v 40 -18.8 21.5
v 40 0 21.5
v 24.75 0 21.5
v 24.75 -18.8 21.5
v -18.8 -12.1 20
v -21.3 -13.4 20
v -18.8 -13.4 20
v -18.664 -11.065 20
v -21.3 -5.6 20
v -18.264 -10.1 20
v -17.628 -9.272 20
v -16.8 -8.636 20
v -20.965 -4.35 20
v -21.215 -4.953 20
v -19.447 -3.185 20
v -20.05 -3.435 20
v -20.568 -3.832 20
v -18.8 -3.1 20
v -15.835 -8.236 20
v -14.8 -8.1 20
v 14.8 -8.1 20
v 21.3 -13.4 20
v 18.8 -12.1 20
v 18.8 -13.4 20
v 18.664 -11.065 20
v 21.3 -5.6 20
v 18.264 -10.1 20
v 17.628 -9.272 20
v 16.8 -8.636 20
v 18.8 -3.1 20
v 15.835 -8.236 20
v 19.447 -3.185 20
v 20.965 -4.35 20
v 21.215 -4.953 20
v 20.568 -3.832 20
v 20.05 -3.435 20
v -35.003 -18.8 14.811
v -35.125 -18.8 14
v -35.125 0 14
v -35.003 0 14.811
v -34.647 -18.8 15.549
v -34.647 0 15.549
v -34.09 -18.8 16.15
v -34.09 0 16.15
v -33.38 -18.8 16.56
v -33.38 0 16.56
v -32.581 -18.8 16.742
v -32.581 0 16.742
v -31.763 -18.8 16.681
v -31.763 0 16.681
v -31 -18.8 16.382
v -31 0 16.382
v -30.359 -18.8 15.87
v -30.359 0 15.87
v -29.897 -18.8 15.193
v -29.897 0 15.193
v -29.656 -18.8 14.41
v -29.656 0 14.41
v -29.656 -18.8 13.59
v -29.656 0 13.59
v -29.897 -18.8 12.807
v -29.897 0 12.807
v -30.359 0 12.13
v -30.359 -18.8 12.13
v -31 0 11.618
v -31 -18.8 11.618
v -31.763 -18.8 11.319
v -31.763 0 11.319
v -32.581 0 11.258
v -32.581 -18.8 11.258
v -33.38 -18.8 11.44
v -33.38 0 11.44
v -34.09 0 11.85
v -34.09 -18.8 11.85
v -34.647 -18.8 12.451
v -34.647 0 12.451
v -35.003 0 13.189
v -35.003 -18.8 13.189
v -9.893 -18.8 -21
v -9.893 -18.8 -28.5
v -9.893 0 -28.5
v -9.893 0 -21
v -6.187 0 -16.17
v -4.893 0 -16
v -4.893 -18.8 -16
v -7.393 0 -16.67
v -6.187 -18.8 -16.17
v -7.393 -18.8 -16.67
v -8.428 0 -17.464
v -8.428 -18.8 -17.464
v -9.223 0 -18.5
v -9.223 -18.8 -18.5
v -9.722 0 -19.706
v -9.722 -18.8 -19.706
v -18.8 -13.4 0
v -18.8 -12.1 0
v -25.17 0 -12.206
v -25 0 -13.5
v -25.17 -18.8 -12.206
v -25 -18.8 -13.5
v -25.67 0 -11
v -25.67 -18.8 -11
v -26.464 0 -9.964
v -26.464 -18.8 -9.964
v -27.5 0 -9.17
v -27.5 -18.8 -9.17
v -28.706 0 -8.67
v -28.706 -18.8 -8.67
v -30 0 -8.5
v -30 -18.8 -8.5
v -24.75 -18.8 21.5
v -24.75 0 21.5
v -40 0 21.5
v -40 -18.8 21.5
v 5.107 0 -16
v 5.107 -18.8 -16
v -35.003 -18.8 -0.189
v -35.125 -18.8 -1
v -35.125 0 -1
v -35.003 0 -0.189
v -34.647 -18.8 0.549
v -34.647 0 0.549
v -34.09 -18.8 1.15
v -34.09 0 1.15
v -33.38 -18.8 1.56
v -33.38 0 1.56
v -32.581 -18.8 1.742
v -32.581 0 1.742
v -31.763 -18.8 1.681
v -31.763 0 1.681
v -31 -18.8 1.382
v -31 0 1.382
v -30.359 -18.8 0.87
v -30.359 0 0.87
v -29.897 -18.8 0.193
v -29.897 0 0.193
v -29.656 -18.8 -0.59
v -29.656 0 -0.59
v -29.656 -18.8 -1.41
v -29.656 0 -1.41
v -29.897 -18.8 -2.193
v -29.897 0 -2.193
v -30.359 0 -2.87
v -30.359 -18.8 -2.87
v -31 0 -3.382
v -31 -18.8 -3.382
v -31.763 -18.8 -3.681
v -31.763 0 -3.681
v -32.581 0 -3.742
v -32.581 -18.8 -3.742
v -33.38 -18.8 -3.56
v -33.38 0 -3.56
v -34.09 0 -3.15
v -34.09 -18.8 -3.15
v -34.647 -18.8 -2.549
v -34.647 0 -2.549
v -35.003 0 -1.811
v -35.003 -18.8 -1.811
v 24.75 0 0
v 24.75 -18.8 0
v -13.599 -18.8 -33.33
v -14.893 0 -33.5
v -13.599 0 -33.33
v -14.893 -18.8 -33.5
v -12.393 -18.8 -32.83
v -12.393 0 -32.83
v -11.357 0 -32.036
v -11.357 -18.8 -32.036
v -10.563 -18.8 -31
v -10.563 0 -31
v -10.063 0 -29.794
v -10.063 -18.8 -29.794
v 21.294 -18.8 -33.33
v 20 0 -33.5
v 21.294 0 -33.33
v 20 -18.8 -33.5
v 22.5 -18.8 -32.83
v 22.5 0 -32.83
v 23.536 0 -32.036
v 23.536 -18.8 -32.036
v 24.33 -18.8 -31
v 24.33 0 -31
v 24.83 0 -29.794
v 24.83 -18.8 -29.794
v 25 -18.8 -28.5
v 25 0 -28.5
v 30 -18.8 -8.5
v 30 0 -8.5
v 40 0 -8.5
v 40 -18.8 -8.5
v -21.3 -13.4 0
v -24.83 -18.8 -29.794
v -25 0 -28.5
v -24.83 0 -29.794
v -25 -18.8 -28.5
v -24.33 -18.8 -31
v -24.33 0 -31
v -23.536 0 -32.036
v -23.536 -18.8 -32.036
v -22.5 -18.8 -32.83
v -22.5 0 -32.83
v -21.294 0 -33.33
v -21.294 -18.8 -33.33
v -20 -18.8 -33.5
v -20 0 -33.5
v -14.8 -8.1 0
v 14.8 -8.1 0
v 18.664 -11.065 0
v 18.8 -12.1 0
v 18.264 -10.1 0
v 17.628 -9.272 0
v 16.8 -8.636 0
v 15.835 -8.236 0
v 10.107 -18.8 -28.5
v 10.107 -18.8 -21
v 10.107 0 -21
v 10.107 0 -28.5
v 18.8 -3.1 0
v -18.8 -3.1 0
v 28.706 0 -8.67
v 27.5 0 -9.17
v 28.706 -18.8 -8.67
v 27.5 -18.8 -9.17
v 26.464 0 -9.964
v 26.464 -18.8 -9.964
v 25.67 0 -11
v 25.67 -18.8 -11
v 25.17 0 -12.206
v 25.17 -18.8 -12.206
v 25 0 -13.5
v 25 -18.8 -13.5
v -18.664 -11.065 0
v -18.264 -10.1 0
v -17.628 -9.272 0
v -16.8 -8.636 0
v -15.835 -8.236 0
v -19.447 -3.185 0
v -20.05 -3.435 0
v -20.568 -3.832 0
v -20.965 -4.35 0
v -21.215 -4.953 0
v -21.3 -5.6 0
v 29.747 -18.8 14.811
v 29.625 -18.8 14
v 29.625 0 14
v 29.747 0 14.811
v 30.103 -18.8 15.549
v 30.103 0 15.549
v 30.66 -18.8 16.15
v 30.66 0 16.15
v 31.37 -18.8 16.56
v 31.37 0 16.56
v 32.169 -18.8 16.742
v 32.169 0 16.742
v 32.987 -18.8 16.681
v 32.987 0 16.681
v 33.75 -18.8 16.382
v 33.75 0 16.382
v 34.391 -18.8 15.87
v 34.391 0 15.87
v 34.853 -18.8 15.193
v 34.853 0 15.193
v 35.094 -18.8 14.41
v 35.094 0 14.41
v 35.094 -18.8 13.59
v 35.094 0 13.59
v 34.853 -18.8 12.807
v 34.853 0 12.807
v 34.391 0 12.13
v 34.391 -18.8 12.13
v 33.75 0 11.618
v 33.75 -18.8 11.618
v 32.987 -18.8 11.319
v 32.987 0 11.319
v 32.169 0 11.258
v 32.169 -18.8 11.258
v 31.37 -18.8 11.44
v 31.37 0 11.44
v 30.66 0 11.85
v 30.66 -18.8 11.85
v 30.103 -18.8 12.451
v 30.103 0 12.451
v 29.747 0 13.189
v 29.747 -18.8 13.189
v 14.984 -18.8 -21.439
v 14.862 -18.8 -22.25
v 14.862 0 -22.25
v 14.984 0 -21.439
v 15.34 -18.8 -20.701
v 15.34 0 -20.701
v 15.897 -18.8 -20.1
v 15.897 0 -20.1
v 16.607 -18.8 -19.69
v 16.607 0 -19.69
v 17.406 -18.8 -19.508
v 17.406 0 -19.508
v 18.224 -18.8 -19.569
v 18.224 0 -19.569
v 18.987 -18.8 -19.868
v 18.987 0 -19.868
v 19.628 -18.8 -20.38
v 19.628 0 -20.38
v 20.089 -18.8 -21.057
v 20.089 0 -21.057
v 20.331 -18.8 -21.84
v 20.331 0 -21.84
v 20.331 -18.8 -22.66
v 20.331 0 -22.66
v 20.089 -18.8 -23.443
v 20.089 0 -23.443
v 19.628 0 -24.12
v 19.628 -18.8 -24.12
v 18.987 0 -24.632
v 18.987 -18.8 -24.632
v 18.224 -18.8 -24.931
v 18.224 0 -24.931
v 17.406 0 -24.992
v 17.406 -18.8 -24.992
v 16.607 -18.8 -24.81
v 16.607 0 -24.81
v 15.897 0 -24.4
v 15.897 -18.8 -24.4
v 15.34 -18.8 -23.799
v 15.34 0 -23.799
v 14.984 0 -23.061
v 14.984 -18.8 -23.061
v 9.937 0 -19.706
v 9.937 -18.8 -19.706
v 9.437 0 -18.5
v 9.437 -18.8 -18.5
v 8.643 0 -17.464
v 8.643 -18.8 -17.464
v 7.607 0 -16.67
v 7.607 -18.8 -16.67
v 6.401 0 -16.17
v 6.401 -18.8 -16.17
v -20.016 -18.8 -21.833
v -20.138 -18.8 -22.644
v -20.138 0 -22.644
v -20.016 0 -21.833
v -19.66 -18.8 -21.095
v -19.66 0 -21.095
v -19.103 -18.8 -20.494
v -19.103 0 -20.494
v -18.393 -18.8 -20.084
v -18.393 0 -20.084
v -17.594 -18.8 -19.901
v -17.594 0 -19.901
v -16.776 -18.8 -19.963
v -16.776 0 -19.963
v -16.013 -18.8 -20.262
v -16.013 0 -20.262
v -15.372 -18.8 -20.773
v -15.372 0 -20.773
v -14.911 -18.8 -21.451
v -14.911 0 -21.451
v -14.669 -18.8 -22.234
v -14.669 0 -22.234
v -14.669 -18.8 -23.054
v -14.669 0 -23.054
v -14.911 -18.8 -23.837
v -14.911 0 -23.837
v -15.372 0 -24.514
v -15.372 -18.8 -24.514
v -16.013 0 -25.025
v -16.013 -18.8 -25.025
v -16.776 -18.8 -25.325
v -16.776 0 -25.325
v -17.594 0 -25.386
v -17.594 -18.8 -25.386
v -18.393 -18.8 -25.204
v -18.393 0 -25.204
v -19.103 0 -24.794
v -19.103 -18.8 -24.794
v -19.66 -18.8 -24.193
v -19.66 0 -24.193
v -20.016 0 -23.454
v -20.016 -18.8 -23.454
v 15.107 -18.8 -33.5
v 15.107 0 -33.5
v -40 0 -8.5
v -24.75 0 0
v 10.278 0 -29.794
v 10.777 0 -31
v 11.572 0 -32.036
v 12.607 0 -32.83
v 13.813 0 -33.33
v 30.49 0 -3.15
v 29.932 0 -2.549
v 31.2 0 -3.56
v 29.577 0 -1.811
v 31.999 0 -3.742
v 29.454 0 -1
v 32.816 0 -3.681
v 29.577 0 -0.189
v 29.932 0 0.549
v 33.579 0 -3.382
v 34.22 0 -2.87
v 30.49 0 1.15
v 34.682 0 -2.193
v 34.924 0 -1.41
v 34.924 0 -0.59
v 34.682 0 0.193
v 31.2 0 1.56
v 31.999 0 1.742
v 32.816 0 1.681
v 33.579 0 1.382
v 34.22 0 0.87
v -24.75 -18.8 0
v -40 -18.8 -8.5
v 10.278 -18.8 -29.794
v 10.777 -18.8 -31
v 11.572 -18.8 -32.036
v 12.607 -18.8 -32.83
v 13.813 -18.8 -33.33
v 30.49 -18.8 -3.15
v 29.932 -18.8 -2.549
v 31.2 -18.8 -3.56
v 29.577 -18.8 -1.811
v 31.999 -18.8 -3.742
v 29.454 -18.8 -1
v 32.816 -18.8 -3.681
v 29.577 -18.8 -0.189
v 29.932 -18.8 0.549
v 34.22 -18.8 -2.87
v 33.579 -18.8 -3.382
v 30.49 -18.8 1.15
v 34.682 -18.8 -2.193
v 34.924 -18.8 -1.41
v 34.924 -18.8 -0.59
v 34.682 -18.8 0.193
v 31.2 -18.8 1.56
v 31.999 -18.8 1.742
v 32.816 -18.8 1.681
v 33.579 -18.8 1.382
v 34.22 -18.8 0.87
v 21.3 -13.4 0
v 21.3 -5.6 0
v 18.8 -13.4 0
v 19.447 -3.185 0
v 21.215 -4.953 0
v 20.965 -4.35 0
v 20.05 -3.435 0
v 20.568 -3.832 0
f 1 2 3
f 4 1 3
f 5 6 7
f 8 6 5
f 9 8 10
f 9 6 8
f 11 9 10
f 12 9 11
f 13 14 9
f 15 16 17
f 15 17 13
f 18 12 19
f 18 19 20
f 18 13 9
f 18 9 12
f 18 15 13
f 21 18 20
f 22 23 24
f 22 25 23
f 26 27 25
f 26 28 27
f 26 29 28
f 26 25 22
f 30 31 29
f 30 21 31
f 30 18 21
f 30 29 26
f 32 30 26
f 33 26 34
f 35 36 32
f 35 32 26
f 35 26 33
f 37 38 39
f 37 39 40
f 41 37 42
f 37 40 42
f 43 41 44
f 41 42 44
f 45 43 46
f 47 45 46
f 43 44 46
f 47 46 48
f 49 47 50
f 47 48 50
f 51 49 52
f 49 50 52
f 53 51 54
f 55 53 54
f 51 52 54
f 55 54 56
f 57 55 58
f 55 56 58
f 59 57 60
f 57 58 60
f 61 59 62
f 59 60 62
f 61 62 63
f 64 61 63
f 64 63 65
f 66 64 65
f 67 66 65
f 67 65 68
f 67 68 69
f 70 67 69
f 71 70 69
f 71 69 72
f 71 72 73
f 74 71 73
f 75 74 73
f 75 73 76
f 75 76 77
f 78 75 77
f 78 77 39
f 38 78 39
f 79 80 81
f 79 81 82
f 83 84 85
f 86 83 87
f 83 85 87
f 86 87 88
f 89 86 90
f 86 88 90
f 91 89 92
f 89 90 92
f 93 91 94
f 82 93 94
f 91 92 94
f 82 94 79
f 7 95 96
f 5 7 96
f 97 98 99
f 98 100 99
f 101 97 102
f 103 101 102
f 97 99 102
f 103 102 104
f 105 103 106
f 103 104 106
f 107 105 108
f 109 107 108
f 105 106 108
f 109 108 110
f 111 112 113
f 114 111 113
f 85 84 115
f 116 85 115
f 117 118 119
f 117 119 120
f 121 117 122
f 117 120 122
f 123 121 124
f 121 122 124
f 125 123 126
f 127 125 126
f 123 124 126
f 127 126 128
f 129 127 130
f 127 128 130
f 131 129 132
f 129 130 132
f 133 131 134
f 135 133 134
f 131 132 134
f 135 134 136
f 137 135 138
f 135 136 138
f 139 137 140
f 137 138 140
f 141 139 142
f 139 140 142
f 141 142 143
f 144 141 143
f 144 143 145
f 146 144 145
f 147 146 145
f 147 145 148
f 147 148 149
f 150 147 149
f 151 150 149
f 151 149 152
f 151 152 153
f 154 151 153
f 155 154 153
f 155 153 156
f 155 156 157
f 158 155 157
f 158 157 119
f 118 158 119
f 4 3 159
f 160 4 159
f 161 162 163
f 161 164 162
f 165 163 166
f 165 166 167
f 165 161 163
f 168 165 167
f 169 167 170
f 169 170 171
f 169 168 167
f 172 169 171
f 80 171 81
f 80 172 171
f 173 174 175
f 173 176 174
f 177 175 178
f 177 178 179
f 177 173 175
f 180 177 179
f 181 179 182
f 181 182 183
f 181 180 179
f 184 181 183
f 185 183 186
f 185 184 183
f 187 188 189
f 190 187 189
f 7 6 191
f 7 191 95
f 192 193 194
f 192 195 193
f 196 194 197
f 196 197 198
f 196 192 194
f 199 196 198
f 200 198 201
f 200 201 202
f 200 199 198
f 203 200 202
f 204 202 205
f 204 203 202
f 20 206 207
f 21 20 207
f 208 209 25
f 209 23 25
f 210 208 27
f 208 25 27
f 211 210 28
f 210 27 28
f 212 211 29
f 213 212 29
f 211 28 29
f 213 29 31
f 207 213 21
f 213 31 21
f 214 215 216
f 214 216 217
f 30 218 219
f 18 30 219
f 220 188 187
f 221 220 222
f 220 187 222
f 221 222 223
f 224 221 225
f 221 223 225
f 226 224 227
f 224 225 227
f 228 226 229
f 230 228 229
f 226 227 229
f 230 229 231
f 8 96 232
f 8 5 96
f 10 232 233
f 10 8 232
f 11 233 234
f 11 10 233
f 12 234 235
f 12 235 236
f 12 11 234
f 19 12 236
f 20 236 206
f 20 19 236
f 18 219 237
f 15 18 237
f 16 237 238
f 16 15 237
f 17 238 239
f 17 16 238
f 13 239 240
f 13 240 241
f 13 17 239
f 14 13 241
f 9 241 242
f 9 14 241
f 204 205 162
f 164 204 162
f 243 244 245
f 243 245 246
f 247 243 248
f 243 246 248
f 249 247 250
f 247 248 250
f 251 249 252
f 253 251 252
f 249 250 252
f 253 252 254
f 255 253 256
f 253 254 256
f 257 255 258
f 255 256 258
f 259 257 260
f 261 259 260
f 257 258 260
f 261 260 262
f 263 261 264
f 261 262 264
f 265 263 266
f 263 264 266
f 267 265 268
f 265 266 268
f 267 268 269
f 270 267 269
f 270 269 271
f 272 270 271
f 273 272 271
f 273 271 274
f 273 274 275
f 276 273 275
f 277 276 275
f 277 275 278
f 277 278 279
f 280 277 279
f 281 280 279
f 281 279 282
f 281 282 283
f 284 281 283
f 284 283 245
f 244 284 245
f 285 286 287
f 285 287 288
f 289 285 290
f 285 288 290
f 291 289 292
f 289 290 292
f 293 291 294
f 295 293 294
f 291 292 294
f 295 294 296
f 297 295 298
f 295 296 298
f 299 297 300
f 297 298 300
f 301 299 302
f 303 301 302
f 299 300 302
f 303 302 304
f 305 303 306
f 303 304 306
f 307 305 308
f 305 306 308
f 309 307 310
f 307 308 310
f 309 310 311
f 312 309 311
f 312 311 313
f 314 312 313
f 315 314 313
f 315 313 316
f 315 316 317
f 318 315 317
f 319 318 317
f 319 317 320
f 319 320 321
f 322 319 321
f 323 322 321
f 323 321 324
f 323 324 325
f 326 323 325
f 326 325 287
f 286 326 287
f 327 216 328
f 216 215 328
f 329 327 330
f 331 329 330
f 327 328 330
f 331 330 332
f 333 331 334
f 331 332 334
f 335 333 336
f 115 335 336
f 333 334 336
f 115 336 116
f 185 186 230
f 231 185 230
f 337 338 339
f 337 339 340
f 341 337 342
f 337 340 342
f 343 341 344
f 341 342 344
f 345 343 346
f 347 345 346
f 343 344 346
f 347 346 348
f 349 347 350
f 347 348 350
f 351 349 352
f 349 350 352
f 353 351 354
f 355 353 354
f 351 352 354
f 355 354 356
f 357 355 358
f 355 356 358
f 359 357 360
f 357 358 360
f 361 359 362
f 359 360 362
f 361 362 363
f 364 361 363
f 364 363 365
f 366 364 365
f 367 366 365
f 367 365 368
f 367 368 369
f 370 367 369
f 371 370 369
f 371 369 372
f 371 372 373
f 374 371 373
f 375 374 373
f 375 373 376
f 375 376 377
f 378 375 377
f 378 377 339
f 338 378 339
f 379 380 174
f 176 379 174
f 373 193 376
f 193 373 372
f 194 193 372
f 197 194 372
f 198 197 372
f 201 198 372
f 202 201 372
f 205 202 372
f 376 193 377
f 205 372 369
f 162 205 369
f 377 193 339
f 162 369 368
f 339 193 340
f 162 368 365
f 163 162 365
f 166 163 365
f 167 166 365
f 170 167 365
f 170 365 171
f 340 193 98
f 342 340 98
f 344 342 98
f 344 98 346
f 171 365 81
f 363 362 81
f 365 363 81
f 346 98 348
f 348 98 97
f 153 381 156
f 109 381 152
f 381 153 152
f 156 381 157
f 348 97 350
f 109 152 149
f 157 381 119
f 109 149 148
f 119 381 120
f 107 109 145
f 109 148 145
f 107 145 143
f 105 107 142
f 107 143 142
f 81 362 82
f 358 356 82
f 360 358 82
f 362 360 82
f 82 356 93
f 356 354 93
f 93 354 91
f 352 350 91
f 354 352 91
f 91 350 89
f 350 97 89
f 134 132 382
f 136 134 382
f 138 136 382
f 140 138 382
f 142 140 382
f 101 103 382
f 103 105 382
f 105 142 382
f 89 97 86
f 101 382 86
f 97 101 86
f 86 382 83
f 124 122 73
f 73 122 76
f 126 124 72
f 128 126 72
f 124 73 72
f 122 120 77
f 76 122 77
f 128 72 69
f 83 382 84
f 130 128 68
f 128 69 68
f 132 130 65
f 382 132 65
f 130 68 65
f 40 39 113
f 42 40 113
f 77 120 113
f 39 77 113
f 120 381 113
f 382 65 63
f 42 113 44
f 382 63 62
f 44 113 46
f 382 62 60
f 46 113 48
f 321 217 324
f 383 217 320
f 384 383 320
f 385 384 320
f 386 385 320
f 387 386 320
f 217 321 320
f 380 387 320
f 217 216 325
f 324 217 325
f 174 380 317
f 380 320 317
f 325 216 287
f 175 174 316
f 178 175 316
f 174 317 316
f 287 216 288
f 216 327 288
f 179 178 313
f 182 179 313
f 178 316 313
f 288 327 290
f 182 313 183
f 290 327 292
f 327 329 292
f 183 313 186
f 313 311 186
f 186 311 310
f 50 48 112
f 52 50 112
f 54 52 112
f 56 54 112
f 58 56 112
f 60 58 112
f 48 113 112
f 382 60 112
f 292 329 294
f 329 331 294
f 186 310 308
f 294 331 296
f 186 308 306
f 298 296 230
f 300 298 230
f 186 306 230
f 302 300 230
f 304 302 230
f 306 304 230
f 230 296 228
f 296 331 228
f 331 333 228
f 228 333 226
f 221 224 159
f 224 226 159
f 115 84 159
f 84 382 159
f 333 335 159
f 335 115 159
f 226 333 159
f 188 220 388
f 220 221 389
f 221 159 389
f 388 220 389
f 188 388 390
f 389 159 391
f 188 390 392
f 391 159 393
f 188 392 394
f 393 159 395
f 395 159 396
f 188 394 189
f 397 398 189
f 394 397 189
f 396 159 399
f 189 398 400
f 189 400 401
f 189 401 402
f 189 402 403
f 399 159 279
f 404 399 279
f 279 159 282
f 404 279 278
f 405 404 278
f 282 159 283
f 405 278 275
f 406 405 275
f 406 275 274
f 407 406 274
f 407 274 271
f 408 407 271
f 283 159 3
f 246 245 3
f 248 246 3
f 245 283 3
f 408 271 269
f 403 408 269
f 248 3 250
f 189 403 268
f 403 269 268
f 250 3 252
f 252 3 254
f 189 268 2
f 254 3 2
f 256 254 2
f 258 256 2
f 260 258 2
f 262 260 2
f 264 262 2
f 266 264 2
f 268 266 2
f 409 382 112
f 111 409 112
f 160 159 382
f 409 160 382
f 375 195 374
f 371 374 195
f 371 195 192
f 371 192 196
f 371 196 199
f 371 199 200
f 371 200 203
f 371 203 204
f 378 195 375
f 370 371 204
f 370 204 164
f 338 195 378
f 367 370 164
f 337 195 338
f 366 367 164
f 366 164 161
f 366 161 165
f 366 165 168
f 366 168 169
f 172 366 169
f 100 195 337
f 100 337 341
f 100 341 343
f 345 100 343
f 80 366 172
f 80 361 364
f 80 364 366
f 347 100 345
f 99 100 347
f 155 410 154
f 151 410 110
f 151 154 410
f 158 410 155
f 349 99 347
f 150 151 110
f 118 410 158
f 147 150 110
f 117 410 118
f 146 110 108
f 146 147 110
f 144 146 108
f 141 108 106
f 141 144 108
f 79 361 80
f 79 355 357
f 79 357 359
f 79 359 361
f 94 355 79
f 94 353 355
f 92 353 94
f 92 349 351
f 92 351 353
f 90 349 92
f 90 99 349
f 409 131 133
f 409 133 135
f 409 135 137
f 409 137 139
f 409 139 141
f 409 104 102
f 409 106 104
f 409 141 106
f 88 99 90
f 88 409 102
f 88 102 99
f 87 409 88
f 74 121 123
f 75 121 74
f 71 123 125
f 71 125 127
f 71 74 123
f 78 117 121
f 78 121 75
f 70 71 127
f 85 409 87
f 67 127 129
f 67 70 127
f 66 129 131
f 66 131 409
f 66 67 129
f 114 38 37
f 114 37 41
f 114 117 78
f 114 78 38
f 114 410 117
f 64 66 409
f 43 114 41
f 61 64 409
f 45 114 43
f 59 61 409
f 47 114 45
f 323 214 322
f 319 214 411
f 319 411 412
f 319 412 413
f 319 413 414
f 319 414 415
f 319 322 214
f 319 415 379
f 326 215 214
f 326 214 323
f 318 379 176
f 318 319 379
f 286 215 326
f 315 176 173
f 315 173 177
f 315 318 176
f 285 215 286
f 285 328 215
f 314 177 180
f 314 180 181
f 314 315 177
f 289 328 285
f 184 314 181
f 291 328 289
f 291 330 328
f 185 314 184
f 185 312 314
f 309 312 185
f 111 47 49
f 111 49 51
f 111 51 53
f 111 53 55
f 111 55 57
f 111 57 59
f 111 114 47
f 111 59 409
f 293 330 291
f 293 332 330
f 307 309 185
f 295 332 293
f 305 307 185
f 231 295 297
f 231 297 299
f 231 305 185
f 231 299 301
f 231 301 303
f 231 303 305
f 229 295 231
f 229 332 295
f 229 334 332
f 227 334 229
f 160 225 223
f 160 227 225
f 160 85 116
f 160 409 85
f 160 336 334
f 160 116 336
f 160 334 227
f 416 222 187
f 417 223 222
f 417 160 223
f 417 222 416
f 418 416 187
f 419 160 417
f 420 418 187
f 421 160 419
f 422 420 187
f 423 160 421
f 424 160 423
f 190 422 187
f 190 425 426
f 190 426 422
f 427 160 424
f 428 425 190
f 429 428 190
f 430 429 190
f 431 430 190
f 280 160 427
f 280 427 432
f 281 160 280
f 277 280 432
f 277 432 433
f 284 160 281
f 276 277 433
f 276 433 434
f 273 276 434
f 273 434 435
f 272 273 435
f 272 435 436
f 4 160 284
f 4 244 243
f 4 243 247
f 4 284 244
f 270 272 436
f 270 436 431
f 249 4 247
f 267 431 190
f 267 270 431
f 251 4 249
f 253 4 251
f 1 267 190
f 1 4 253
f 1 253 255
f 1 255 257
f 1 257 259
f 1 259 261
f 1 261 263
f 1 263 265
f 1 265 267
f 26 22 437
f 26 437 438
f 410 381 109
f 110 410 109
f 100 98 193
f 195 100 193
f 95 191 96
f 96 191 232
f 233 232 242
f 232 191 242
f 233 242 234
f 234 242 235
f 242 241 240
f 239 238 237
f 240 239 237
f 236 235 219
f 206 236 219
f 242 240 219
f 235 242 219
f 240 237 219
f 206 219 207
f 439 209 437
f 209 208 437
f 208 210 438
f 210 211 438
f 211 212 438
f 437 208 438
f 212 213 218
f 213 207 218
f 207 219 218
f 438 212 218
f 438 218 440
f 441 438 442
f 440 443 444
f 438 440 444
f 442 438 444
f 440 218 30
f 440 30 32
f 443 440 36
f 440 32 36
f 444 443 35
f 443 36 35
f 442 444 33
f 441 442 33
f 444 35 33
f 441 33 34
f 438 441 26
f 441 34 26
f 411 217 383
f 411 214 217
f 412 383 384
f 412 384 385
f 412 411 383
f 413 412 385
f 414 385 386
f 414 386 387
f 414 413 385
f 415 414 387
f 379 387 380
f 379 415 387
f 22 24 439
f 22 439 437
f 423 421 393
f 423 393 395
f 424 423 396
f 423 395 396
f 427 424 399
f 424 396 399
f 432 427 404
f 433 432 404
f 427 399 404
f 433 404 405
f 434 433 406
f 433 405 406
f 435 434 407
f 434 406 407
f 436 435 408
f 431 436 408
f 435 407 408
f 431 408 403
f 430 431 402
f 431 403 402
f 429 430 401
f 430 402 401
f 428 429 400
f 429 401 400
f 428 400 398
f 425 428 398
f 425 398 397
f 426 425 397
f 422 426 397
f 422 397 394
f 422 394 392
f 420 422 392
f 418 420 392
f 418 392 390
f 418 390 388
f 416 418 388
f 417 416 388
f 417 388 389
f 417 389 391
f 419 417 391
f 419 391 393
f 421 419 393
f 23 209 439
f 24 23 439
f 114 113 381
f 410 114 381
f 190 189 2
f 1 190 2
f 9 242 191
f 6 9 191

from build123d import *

# Parameters (mm, degrees)
F1_DEPTH = 18.8
F3_DEPTH = 20
F4_R     = 4
F5_R     = 2.5
F6_R     = 2.5
F7_R     = 4
F8_R     = 5
F10_R    = 5
F11_R    = 5
F12_R    = 5
F13_D    = 5.5


with BuildPart() as f1:
    # F0 (on Front) → F1 (new body)
    with BuildSketch(Plane.XZ):
        Polygon((-24.75, 21.5), (-40, 21.5), (-40, -8.5), (-25, -8.5), (-25, -33.5), (-9.892726, -33.5), (-9.892726, -16), (10.107274, -16), (10.107274, -33.5), (25, -33.5), (25, -8.5), (40, -8.5), (40, 21.5), (24.75, 21.5), (24.75, 0), (-24.75, 0), align=None)
    extrude(amount=F1_DEPTH)

    # F8
    f8_edges = [f1.edges().sort_by_distance(p)[0] for p in [
        (-25, -9.4, -33.5),
        (-9.892726, -9.4, -33.5),
        (10.107274, -9.4, -33.5),
        (25, -9.4, -33.5),
    ]]
    fillet(f8_edges, radius=F8_R)

    # F10
    f10_edges = [f1.edges().sort_by_distance(p)[0] for p in [
        (-25, -9.4, -8.5),
    ]]
    fillet(f10_edges, radius=F10_R)

    # F11
    f11_edges = [f1.edges().sort_by_distance(p)[0] for p in [
        (25, -9.4, -8.5),
    ]]
    fillet(f11_edges, radius=F11_R)

    # F12
    f12_edges = [f1.edges().sort_by_distance(p)[0] for p in [
        (-9.892726, -9.4, -16),
        (10.107274, -9.4, -16),
    ]]
    fillet(f12_edges, radius=F12_R)

    # F13 (through all)
    with Locations(Plane.XZ.offset(18.8)):
        with Locations((-32.375, 14), (-32.375, -1), (32.375, 14), (32.204479, -1), (17.611818, -22.25), (-17.388182, -22.643771)):
            Hole(F13_D / 2)


with BuildPart() as f3:
    # F2 (on face) → F3 (new body)
    with BuildSketch(Plane.XY):
        Polygon((21.3, -3.1), (-21.3, -3.1), (-21.3, -13.4), (-18.8, -13.4), (-18.8, -8.1), (18.8, -8.1), (18.8, -13.4), (21.3, -13.4), align=None)
    extrude(amount=F3_DEPTH)

    # F4
    f4_edges = [f3.edges().sort_by_distance(p)[0] for p in [
        (-18.8, -8.1, 10),
    ]]
    fillet(f4_edges, radius=F4_R)

    # F5
    f5_edges = [f3.edges().sort_by_distance(p)[0] for p in [
        (21.3, -3.1, 10),
    ]]
    fillet(f5_edges, radius=F5_R)

    # F6
    f6_edges = [f3.edges().sort_by_distance(p)[0] for p in [
        (-21.3, -3.1, 10),
    ]]
    fillet(f6_edges, radius=F6_R)

    # F7
    f7_edges = [f3.edges().sort_by_distance(p)[0] for p in [
        (18.8, -8.1, 10),
    ]]
    fillet(f7_edges, radius=F7_R)


solid = Compound([f1.part, f3.part])
